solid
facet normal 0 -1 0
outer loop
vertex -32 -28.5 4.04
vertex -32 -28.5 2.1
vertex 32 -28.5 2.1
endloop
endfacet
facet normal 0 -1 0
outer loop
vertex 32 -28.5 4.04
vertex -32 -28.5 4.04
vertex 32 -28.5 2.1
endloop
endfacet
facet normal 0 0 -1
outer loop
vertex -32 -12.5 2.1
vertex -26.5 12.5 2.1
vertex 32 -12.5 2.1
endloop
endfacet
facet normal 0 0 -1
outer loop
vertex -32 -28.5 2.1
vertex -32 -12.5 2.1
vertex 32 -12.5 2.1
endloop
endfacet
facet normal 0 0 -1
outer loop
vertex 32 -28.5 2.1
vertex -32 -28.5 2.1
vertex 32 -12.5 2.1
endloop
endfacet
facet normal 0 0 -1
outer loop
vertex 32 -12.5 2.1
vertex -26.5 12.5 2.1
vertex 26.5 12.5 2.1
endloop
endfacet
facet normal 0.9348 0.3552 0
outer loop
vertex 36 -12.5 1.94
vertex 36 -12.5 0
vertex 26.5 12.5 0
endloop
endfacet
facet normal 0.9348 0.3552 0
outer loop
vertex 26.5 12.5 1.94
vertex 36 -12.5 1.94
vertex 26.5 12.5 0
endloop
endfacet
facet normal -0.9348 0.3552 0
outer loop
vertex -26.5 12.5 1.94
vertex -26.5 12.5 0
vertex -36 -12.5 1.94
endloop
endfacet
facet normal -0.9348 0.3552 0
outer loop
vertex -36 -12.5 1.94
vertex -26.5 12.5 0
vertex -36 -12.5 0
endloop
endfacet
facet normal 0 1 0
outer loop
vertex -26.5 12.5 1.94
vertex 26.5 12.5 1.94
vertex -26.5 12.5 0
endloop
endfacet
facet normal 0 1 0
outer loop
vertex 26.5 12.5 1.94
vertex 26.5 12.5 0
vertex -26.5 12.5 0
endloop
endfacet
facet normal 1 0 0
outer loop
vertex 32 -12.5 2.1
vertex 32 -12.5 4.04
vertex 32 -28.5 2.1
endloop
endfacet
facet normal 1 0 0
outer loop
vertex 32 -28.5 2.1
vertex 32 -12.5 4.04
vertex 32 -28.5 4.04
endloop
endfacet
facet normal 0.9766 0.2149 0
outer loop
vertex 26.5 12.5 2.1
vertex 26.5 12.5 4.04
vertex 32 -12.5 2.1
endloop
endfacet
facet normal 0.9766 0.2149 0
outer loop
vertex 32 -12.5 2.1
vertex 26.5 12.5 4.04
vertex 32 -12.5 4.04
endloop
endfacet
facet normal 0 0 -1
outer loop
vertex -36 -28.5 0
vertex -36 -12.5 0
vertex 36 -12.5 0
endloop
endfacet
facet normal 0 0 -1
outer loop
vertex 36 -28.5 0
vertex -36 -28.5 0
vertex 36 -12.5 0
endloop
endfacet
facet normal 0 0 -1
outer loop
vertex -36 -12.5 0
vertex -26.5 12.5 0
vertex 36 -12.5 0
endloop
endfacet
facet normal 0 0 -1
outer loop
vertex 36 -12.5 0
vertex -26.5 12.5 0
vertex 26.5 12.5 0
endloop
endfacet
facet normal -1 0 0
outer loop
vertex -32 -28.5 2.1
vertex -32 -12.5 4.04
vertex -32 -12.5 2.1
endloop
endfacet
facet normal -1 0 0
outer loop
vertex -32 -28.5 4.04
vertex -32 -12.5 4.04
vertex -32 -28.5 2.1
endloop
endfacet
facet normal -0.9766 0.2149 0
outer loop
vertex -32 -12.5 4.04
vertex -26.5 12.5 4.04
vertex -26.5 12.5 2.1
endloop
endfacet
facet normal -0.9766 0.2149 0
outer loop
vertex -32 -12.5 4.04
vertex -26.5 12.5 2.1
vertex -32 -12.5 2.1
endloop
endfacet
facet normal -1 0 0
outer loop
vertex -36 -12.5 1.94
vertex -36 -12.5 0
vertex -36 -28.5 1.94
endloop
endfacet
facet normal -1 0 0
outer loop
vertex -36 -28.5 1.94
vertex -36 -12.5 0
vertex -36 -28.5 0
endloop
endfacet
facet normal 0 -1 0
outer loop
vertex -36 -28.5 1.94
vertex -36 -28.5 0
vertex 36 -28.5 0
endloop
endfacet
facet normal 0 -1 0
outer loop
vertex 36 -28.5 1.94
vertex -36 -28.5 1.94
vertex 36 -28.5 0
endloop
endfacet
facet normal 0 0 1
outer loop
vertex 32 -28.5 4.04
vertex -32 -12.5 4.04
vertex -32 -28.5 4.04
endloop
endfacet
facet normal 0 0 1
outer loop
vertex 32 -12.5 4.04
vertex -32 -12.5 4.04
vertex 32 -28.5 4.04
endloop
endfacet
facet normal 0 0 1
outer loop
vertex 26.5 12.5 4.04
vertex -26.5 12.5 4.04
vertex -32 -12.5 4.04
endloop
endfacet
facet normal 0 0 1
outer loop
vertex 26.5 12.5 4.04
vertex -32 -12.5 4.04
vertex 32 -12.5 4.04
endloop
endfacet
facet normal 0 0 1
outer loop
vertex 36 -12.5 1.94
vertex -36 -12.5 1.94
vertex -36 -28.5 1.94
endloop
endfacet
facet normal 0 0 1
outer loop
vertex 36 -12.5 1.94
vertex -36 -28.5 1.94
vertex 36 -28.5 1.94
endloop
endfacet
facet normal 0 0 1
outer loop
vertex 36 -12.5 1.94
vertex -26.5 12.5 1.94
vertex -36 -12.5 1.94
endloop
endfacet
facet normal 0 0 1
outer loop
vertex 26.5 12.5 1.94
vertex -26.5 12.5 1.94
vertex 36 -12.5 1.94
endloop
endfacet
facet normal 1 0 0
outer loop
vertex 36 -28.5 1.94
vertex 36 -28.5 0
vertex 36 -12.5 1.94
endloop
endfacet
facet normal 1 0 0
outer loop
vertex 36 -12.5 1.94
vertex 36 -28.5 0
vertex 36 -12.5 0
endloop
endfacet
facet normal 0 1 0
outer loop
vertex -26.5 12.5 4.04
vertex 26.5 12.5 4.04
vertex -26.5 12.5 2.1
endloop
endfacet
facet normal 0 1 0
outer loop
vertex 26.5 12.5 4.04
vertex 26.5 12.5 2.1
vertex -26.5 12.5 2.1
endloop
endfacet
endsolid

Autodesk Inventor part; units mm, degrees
ref_plane "YZ Plane" through (0, 0, 0) normal (1, 0, 0) x (0, 1, 0)
ref_plane "XZ Plane" through (0, 0, 0) normal (0, 1, 0) x (-1, 0, 0)
ref_plane "XY Plane" through (0, 0, 0) normal (0, 0, 1) x (1, 0, 0)
sketch "Sketch1" plane through (0, 0, 0) normal (0, 0, 1) x (1, 0, 0)
  line L0 (-36, -28.5) -> (36, -28.5)
  line L1 (36, -28.5) -> (36, -12.5)
  line L2 (36, -12.5) -> (26.5, 12.5)
  line L3 (26.5, 12.5) -> (-26.5, 12.5)
  line L4 (-26.5, 12.5) -> (-36, -12.5)
  line L5 (-36, -12.5) -> (-36, -28.5)
  point P0 (0, 0)
  point P1 (0, -28.5)
  point P2 (-31.25, 0)
  dimension "d0" = 72
  dimension "d1" = 41
  dimension "d2" = 53
  dimension "d3" = 16
extrude "Extrusion1" add sketch "Sketch1" along normal blind 1.94
pattern_linear "Rectangular Pattern1" count 2 spacing 2.1 along (0, 0, 1) of "Extrusion1"
sketch "Sketch2" plane through (-36, -28.5, 4.04) normal (0, 0, 1) x (1, 0, 0)
  line L0 (0, 0) -> (72, 0) projected
  line L1 (72, 0) -> (72, 16) projected
  line L2 (72, 16) -> (62.5, 41) projected
  line L3 (62.5, 41) -> (9.5, 41) projected
  line L4 (9.5, 41) -> (0, 16) projected
  line L5 (0, 16) -> (0, 0) projected
  line L6 (62.5, 41) -> (9.5, 41) projected
  line L7 (9.5, 41) -> (4, 16)
  line L8 (4, 16) -> (4, 0)
  line L9 (62.5, 41) -> (68, 16)
  line L10 (68, 16) -> (68, 0)
  line L11 (0, 0) -> (72, 0) projected
  point P0 (36, 28.5)
  dimension "d9" = 64
extrude "Extrusion2" cut sketch "Sketch2" against normal up to next contours L5 L4 L7 L8 L0 | L10 L9 L2 L1 L0
properties part number "Game_VenusAwards"
